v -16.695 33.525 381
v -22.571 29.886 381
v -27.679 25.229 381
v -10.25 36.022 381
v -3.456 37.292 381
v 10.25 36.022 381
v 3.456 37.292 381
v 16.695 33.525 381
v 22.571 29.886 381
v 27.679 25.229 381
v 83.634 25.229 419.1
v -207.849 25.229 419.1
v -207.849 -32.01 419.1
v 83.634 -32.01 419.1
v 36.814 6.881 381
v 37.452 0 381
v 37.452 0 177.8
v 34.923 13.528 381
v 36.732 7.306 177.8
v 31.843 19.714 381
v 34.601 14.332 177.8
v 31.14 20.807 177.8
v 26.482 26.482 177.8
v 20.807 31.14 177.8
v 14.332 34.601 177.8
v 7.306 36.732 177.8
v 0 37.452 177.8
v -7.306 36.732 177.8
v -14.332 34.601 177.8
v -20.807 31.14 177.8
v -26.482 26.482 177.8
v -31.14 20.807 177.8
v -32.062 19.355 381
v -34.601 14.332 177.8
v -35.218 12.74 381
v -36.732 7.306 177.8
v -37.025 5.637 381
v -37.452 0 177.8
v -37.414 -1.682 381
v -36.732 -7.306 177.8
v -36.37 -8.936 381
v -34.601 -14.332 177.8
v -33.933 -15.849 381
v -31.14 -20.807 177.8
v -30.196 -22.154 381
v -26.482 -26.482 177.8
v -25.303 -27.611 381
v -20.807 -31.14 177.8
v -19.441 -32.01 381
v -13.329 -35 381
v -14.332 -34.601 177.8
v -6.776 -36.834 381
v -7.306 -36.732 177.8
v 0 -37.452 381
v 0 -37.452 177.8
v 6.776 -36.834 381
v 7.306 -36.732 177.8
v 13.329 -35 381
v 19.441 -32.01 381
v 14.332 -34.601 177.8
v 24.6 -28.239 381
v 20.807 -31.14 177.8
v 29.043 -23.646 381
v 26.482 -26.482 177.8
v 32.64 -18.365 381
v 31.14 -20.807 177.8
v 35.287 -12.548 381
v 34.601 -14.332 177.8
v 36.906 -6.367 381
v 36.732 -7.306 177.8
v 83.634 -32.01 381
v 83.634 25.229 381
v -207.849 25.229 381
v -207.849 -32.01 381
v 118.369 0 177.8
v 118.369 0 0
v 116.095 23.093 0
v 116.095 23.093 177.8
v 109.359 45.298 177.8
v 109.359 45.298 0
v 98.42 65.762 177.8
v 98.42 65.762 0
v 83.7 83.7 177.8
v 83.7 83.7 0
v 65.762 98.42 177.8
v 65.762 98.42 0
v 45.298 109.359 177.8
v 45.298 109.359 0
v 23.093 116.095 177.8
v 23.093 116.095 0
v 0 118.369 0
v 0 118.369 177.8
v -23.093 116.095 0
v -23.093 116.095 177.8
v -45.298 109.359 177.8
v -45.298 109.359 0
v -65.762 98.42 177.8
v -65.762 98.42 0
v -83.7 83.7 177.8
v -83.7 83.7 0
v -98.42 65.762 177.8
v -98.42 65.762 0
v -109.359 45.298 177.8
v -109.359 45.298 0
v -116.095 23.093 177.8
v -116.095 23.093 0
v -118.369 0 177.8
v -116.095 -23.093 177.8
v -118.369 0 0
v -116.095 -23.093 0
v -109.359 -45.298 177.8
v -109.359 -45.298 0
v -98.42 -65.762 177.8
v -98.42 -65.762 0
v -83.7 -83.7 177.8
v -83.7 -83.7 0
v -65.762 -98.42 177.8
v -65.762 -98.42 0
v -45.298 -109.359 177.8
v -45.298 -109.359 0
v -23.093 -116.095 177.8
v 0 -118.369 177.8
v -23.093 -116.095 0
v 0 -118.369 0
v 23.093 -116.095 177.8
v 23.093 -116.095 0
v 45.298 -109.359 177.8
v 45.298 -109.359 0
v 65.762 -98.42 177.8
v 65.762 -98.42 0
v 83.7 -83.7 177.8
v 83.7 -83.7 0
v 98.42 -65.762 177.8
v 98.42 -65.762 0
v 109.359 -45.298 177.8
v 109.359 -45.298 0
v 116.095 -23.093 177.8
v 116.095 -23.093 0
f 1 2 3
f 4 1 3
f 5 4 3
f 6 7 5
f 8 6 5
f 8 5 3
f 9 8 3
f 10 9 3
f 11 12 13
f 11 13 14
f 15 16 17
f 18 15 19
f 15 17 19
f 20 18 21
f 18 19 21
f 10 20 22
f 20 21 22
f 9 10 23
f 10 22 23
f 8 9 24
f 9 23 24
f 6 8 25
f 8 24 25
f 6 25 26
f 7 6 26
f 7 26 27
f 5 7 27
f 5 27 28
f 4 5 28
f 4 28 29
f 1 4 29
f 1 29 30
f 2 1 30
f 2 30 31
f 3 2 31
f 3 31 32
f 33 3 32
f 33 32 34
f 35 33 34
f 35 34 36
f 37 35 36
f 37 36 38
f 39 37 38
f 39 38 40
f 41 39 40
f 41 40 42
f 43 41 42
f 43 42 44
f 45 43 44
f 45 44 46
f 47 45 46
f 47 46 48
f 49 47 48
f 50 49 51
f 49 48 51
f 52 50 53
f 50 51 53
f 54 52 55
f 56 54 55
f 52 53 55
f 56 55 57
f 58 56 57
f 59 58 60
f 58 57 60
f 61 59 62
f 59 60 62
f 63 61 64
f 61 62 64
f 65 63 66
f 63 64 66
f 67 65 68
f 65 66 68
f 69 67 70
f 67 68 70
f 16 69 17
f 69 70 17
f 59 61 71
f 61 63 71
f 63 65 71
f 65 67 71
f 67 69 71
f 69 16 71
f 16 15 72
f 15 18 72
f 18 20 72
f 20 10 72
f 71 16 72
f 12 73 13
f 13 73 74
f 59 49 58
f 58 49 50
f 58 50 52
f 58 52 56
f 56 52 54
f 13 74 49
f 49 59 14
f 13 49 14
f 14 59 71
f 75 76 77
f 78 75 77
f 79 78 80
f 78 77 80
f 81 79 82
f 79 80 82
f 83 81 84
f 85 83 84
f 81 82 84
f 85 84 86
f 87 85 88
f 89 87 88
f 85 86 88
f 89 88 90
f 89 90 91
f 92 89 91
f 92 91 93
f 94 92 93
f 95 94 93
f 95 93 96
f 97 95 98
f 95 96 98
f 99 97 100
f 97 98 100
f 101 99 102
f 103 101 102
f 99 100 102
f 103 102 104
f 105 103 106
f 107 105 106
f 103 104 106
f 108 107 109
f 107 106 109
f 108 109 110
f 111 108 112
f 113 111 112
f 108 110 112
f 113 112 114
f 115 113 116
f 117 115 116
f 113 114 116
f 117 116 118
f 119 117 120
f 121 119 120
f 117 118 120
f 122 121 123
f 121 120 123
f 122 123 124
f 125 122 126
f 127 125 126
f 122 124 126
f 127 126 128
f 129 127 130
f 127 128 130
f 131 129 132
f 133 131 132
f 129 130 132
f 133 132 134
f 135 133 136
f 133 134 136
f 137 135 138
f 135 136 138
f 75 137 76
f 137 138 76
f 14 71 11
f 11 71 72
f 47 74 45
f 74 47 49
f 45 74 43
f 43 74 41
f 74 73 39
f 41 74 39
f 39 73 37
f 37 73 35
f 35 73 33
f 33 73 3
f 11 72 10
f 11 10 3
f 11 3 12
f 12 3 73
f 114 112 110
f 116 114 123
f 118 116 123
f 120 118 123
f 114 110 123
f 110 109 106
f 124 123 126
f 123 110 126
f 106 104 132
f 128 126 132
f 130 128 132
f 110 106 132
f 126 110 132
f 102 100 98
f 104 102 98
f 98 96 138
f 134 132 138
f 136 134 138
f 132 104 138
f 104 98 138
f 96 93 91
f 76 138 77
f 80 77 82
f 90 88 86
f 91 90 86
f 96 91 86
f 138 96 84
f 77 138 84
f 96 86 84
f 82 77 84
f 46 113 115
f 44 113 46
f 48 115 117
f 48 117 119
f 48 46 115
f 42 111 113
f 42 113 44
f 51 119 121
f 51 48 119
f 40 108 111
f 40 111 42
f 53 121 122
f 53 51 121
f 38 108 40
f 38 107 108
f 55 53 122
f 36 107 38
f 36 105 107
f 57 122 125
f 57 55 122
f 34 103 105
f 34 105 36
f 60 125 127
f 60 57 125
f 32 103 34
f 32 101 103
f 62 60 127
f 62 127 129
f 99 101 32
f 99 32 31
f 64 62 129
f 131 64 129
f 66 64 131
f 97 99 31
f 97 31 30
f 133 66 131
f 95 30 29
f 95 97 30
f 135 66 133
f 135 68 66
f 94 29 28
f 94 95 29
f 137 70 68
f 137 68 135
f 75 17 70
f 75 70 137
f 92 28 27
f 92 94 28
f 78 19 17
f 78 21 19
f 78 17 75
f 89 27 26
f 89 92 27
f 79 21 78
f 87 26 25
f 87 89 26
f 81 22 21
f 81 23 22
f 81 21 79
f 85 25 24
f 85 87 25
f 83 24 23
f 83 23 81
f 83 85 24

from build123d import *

# Parameters (mm, degrees)
F0_R     = 118.3690263596
F1_DEPTH = 177.8
F2_R     = 37.4516479343
F3_DEPTH = 203.2
F5_DEPTH = 38.1


with BuildPart() as f1:
    # F0 (on Top) → F1 (new body)
    with BuildSketch(Plane.XY):
        Circle(F0_R)
    extrude(amount=F1_DEPTH)

    # F2 (on face) → F3 (join)
    with BuildSketch(Plane.XY.offset(177.8)):
        Circle(F2_R)
    extrude(amount=F3_DEPTH)

    # F4 (on face) → F5 (join)
    with BuildSketch(Plane.XY.offset(381)):
        with BuildLine():
            Line((27.6787410495, 25.2292137593), (0, 25.2292137593))
            Line((0, 25.2292137593), (-27.6787410495, 25.2292137593))
            ThreePointArc((-27.6787410495, 25.2292137593), (-37.0697451311, -5.3347848045), (-19.441274734, -32.0103541017))
            Line((-19.441274734, -32.0103541017), (0, -32.0103541017))
            Line((0, -32.0103541017), (19.441274734, -32.0103541017))
            ThreePointArc((19.441274734, -32.0103541017), (32.6399579483, -18.3646148376), (37.4516479343, 0))
            ThreePointArc((37.4516479343, 0), (34.9230611348, 13.5279611906), (27.6787410495, 25.2292137593))
        make_face()
        with BuildLine():
            Line((83.6336314678, 25.2292137593), (27.6787410495, 25.2292137593))
            ThreePointArc((27.6787410495, 25.2292137593), (34.9230611348, 13.5279611906), (37.4516479343, 0))
            ThreePointArc((37.4516479343, 0), (32.6399579483, -18.3646148376), (19.441274734, -32.0103541017))
            Line((19.441274734, -32.0103541017), (83.6336314678, -32.0103541017))
            Line((83.6336314678, -32.0103541017), (83.6336314678, 0))
            Line((83.6336314678, 0), (83.6336314678, 25.2292137593))
        make_face()
        with BuildLine():
            ThreePointArc((-19.441274734, -32.0103541017), (-37.0697451311, -5.3347848045), (-27.6787410495, 25.2292137593))
            Line((-27.6787410495, 25.2292137593), (-207.8490108252, 25.2292137593))
            Line((-207.8490108252, 25.2292137593), (-207.8490108252, 0))
            Line((-207.8490108252, 0), (-207.8490108252, -32.0103541017))
            Line((-207.8490108252, -32.0103541017), (-19.441274734, -32.0103541017))
        make_face()
    extrude(amount=F5_DEPTH)


solid = f1.part
